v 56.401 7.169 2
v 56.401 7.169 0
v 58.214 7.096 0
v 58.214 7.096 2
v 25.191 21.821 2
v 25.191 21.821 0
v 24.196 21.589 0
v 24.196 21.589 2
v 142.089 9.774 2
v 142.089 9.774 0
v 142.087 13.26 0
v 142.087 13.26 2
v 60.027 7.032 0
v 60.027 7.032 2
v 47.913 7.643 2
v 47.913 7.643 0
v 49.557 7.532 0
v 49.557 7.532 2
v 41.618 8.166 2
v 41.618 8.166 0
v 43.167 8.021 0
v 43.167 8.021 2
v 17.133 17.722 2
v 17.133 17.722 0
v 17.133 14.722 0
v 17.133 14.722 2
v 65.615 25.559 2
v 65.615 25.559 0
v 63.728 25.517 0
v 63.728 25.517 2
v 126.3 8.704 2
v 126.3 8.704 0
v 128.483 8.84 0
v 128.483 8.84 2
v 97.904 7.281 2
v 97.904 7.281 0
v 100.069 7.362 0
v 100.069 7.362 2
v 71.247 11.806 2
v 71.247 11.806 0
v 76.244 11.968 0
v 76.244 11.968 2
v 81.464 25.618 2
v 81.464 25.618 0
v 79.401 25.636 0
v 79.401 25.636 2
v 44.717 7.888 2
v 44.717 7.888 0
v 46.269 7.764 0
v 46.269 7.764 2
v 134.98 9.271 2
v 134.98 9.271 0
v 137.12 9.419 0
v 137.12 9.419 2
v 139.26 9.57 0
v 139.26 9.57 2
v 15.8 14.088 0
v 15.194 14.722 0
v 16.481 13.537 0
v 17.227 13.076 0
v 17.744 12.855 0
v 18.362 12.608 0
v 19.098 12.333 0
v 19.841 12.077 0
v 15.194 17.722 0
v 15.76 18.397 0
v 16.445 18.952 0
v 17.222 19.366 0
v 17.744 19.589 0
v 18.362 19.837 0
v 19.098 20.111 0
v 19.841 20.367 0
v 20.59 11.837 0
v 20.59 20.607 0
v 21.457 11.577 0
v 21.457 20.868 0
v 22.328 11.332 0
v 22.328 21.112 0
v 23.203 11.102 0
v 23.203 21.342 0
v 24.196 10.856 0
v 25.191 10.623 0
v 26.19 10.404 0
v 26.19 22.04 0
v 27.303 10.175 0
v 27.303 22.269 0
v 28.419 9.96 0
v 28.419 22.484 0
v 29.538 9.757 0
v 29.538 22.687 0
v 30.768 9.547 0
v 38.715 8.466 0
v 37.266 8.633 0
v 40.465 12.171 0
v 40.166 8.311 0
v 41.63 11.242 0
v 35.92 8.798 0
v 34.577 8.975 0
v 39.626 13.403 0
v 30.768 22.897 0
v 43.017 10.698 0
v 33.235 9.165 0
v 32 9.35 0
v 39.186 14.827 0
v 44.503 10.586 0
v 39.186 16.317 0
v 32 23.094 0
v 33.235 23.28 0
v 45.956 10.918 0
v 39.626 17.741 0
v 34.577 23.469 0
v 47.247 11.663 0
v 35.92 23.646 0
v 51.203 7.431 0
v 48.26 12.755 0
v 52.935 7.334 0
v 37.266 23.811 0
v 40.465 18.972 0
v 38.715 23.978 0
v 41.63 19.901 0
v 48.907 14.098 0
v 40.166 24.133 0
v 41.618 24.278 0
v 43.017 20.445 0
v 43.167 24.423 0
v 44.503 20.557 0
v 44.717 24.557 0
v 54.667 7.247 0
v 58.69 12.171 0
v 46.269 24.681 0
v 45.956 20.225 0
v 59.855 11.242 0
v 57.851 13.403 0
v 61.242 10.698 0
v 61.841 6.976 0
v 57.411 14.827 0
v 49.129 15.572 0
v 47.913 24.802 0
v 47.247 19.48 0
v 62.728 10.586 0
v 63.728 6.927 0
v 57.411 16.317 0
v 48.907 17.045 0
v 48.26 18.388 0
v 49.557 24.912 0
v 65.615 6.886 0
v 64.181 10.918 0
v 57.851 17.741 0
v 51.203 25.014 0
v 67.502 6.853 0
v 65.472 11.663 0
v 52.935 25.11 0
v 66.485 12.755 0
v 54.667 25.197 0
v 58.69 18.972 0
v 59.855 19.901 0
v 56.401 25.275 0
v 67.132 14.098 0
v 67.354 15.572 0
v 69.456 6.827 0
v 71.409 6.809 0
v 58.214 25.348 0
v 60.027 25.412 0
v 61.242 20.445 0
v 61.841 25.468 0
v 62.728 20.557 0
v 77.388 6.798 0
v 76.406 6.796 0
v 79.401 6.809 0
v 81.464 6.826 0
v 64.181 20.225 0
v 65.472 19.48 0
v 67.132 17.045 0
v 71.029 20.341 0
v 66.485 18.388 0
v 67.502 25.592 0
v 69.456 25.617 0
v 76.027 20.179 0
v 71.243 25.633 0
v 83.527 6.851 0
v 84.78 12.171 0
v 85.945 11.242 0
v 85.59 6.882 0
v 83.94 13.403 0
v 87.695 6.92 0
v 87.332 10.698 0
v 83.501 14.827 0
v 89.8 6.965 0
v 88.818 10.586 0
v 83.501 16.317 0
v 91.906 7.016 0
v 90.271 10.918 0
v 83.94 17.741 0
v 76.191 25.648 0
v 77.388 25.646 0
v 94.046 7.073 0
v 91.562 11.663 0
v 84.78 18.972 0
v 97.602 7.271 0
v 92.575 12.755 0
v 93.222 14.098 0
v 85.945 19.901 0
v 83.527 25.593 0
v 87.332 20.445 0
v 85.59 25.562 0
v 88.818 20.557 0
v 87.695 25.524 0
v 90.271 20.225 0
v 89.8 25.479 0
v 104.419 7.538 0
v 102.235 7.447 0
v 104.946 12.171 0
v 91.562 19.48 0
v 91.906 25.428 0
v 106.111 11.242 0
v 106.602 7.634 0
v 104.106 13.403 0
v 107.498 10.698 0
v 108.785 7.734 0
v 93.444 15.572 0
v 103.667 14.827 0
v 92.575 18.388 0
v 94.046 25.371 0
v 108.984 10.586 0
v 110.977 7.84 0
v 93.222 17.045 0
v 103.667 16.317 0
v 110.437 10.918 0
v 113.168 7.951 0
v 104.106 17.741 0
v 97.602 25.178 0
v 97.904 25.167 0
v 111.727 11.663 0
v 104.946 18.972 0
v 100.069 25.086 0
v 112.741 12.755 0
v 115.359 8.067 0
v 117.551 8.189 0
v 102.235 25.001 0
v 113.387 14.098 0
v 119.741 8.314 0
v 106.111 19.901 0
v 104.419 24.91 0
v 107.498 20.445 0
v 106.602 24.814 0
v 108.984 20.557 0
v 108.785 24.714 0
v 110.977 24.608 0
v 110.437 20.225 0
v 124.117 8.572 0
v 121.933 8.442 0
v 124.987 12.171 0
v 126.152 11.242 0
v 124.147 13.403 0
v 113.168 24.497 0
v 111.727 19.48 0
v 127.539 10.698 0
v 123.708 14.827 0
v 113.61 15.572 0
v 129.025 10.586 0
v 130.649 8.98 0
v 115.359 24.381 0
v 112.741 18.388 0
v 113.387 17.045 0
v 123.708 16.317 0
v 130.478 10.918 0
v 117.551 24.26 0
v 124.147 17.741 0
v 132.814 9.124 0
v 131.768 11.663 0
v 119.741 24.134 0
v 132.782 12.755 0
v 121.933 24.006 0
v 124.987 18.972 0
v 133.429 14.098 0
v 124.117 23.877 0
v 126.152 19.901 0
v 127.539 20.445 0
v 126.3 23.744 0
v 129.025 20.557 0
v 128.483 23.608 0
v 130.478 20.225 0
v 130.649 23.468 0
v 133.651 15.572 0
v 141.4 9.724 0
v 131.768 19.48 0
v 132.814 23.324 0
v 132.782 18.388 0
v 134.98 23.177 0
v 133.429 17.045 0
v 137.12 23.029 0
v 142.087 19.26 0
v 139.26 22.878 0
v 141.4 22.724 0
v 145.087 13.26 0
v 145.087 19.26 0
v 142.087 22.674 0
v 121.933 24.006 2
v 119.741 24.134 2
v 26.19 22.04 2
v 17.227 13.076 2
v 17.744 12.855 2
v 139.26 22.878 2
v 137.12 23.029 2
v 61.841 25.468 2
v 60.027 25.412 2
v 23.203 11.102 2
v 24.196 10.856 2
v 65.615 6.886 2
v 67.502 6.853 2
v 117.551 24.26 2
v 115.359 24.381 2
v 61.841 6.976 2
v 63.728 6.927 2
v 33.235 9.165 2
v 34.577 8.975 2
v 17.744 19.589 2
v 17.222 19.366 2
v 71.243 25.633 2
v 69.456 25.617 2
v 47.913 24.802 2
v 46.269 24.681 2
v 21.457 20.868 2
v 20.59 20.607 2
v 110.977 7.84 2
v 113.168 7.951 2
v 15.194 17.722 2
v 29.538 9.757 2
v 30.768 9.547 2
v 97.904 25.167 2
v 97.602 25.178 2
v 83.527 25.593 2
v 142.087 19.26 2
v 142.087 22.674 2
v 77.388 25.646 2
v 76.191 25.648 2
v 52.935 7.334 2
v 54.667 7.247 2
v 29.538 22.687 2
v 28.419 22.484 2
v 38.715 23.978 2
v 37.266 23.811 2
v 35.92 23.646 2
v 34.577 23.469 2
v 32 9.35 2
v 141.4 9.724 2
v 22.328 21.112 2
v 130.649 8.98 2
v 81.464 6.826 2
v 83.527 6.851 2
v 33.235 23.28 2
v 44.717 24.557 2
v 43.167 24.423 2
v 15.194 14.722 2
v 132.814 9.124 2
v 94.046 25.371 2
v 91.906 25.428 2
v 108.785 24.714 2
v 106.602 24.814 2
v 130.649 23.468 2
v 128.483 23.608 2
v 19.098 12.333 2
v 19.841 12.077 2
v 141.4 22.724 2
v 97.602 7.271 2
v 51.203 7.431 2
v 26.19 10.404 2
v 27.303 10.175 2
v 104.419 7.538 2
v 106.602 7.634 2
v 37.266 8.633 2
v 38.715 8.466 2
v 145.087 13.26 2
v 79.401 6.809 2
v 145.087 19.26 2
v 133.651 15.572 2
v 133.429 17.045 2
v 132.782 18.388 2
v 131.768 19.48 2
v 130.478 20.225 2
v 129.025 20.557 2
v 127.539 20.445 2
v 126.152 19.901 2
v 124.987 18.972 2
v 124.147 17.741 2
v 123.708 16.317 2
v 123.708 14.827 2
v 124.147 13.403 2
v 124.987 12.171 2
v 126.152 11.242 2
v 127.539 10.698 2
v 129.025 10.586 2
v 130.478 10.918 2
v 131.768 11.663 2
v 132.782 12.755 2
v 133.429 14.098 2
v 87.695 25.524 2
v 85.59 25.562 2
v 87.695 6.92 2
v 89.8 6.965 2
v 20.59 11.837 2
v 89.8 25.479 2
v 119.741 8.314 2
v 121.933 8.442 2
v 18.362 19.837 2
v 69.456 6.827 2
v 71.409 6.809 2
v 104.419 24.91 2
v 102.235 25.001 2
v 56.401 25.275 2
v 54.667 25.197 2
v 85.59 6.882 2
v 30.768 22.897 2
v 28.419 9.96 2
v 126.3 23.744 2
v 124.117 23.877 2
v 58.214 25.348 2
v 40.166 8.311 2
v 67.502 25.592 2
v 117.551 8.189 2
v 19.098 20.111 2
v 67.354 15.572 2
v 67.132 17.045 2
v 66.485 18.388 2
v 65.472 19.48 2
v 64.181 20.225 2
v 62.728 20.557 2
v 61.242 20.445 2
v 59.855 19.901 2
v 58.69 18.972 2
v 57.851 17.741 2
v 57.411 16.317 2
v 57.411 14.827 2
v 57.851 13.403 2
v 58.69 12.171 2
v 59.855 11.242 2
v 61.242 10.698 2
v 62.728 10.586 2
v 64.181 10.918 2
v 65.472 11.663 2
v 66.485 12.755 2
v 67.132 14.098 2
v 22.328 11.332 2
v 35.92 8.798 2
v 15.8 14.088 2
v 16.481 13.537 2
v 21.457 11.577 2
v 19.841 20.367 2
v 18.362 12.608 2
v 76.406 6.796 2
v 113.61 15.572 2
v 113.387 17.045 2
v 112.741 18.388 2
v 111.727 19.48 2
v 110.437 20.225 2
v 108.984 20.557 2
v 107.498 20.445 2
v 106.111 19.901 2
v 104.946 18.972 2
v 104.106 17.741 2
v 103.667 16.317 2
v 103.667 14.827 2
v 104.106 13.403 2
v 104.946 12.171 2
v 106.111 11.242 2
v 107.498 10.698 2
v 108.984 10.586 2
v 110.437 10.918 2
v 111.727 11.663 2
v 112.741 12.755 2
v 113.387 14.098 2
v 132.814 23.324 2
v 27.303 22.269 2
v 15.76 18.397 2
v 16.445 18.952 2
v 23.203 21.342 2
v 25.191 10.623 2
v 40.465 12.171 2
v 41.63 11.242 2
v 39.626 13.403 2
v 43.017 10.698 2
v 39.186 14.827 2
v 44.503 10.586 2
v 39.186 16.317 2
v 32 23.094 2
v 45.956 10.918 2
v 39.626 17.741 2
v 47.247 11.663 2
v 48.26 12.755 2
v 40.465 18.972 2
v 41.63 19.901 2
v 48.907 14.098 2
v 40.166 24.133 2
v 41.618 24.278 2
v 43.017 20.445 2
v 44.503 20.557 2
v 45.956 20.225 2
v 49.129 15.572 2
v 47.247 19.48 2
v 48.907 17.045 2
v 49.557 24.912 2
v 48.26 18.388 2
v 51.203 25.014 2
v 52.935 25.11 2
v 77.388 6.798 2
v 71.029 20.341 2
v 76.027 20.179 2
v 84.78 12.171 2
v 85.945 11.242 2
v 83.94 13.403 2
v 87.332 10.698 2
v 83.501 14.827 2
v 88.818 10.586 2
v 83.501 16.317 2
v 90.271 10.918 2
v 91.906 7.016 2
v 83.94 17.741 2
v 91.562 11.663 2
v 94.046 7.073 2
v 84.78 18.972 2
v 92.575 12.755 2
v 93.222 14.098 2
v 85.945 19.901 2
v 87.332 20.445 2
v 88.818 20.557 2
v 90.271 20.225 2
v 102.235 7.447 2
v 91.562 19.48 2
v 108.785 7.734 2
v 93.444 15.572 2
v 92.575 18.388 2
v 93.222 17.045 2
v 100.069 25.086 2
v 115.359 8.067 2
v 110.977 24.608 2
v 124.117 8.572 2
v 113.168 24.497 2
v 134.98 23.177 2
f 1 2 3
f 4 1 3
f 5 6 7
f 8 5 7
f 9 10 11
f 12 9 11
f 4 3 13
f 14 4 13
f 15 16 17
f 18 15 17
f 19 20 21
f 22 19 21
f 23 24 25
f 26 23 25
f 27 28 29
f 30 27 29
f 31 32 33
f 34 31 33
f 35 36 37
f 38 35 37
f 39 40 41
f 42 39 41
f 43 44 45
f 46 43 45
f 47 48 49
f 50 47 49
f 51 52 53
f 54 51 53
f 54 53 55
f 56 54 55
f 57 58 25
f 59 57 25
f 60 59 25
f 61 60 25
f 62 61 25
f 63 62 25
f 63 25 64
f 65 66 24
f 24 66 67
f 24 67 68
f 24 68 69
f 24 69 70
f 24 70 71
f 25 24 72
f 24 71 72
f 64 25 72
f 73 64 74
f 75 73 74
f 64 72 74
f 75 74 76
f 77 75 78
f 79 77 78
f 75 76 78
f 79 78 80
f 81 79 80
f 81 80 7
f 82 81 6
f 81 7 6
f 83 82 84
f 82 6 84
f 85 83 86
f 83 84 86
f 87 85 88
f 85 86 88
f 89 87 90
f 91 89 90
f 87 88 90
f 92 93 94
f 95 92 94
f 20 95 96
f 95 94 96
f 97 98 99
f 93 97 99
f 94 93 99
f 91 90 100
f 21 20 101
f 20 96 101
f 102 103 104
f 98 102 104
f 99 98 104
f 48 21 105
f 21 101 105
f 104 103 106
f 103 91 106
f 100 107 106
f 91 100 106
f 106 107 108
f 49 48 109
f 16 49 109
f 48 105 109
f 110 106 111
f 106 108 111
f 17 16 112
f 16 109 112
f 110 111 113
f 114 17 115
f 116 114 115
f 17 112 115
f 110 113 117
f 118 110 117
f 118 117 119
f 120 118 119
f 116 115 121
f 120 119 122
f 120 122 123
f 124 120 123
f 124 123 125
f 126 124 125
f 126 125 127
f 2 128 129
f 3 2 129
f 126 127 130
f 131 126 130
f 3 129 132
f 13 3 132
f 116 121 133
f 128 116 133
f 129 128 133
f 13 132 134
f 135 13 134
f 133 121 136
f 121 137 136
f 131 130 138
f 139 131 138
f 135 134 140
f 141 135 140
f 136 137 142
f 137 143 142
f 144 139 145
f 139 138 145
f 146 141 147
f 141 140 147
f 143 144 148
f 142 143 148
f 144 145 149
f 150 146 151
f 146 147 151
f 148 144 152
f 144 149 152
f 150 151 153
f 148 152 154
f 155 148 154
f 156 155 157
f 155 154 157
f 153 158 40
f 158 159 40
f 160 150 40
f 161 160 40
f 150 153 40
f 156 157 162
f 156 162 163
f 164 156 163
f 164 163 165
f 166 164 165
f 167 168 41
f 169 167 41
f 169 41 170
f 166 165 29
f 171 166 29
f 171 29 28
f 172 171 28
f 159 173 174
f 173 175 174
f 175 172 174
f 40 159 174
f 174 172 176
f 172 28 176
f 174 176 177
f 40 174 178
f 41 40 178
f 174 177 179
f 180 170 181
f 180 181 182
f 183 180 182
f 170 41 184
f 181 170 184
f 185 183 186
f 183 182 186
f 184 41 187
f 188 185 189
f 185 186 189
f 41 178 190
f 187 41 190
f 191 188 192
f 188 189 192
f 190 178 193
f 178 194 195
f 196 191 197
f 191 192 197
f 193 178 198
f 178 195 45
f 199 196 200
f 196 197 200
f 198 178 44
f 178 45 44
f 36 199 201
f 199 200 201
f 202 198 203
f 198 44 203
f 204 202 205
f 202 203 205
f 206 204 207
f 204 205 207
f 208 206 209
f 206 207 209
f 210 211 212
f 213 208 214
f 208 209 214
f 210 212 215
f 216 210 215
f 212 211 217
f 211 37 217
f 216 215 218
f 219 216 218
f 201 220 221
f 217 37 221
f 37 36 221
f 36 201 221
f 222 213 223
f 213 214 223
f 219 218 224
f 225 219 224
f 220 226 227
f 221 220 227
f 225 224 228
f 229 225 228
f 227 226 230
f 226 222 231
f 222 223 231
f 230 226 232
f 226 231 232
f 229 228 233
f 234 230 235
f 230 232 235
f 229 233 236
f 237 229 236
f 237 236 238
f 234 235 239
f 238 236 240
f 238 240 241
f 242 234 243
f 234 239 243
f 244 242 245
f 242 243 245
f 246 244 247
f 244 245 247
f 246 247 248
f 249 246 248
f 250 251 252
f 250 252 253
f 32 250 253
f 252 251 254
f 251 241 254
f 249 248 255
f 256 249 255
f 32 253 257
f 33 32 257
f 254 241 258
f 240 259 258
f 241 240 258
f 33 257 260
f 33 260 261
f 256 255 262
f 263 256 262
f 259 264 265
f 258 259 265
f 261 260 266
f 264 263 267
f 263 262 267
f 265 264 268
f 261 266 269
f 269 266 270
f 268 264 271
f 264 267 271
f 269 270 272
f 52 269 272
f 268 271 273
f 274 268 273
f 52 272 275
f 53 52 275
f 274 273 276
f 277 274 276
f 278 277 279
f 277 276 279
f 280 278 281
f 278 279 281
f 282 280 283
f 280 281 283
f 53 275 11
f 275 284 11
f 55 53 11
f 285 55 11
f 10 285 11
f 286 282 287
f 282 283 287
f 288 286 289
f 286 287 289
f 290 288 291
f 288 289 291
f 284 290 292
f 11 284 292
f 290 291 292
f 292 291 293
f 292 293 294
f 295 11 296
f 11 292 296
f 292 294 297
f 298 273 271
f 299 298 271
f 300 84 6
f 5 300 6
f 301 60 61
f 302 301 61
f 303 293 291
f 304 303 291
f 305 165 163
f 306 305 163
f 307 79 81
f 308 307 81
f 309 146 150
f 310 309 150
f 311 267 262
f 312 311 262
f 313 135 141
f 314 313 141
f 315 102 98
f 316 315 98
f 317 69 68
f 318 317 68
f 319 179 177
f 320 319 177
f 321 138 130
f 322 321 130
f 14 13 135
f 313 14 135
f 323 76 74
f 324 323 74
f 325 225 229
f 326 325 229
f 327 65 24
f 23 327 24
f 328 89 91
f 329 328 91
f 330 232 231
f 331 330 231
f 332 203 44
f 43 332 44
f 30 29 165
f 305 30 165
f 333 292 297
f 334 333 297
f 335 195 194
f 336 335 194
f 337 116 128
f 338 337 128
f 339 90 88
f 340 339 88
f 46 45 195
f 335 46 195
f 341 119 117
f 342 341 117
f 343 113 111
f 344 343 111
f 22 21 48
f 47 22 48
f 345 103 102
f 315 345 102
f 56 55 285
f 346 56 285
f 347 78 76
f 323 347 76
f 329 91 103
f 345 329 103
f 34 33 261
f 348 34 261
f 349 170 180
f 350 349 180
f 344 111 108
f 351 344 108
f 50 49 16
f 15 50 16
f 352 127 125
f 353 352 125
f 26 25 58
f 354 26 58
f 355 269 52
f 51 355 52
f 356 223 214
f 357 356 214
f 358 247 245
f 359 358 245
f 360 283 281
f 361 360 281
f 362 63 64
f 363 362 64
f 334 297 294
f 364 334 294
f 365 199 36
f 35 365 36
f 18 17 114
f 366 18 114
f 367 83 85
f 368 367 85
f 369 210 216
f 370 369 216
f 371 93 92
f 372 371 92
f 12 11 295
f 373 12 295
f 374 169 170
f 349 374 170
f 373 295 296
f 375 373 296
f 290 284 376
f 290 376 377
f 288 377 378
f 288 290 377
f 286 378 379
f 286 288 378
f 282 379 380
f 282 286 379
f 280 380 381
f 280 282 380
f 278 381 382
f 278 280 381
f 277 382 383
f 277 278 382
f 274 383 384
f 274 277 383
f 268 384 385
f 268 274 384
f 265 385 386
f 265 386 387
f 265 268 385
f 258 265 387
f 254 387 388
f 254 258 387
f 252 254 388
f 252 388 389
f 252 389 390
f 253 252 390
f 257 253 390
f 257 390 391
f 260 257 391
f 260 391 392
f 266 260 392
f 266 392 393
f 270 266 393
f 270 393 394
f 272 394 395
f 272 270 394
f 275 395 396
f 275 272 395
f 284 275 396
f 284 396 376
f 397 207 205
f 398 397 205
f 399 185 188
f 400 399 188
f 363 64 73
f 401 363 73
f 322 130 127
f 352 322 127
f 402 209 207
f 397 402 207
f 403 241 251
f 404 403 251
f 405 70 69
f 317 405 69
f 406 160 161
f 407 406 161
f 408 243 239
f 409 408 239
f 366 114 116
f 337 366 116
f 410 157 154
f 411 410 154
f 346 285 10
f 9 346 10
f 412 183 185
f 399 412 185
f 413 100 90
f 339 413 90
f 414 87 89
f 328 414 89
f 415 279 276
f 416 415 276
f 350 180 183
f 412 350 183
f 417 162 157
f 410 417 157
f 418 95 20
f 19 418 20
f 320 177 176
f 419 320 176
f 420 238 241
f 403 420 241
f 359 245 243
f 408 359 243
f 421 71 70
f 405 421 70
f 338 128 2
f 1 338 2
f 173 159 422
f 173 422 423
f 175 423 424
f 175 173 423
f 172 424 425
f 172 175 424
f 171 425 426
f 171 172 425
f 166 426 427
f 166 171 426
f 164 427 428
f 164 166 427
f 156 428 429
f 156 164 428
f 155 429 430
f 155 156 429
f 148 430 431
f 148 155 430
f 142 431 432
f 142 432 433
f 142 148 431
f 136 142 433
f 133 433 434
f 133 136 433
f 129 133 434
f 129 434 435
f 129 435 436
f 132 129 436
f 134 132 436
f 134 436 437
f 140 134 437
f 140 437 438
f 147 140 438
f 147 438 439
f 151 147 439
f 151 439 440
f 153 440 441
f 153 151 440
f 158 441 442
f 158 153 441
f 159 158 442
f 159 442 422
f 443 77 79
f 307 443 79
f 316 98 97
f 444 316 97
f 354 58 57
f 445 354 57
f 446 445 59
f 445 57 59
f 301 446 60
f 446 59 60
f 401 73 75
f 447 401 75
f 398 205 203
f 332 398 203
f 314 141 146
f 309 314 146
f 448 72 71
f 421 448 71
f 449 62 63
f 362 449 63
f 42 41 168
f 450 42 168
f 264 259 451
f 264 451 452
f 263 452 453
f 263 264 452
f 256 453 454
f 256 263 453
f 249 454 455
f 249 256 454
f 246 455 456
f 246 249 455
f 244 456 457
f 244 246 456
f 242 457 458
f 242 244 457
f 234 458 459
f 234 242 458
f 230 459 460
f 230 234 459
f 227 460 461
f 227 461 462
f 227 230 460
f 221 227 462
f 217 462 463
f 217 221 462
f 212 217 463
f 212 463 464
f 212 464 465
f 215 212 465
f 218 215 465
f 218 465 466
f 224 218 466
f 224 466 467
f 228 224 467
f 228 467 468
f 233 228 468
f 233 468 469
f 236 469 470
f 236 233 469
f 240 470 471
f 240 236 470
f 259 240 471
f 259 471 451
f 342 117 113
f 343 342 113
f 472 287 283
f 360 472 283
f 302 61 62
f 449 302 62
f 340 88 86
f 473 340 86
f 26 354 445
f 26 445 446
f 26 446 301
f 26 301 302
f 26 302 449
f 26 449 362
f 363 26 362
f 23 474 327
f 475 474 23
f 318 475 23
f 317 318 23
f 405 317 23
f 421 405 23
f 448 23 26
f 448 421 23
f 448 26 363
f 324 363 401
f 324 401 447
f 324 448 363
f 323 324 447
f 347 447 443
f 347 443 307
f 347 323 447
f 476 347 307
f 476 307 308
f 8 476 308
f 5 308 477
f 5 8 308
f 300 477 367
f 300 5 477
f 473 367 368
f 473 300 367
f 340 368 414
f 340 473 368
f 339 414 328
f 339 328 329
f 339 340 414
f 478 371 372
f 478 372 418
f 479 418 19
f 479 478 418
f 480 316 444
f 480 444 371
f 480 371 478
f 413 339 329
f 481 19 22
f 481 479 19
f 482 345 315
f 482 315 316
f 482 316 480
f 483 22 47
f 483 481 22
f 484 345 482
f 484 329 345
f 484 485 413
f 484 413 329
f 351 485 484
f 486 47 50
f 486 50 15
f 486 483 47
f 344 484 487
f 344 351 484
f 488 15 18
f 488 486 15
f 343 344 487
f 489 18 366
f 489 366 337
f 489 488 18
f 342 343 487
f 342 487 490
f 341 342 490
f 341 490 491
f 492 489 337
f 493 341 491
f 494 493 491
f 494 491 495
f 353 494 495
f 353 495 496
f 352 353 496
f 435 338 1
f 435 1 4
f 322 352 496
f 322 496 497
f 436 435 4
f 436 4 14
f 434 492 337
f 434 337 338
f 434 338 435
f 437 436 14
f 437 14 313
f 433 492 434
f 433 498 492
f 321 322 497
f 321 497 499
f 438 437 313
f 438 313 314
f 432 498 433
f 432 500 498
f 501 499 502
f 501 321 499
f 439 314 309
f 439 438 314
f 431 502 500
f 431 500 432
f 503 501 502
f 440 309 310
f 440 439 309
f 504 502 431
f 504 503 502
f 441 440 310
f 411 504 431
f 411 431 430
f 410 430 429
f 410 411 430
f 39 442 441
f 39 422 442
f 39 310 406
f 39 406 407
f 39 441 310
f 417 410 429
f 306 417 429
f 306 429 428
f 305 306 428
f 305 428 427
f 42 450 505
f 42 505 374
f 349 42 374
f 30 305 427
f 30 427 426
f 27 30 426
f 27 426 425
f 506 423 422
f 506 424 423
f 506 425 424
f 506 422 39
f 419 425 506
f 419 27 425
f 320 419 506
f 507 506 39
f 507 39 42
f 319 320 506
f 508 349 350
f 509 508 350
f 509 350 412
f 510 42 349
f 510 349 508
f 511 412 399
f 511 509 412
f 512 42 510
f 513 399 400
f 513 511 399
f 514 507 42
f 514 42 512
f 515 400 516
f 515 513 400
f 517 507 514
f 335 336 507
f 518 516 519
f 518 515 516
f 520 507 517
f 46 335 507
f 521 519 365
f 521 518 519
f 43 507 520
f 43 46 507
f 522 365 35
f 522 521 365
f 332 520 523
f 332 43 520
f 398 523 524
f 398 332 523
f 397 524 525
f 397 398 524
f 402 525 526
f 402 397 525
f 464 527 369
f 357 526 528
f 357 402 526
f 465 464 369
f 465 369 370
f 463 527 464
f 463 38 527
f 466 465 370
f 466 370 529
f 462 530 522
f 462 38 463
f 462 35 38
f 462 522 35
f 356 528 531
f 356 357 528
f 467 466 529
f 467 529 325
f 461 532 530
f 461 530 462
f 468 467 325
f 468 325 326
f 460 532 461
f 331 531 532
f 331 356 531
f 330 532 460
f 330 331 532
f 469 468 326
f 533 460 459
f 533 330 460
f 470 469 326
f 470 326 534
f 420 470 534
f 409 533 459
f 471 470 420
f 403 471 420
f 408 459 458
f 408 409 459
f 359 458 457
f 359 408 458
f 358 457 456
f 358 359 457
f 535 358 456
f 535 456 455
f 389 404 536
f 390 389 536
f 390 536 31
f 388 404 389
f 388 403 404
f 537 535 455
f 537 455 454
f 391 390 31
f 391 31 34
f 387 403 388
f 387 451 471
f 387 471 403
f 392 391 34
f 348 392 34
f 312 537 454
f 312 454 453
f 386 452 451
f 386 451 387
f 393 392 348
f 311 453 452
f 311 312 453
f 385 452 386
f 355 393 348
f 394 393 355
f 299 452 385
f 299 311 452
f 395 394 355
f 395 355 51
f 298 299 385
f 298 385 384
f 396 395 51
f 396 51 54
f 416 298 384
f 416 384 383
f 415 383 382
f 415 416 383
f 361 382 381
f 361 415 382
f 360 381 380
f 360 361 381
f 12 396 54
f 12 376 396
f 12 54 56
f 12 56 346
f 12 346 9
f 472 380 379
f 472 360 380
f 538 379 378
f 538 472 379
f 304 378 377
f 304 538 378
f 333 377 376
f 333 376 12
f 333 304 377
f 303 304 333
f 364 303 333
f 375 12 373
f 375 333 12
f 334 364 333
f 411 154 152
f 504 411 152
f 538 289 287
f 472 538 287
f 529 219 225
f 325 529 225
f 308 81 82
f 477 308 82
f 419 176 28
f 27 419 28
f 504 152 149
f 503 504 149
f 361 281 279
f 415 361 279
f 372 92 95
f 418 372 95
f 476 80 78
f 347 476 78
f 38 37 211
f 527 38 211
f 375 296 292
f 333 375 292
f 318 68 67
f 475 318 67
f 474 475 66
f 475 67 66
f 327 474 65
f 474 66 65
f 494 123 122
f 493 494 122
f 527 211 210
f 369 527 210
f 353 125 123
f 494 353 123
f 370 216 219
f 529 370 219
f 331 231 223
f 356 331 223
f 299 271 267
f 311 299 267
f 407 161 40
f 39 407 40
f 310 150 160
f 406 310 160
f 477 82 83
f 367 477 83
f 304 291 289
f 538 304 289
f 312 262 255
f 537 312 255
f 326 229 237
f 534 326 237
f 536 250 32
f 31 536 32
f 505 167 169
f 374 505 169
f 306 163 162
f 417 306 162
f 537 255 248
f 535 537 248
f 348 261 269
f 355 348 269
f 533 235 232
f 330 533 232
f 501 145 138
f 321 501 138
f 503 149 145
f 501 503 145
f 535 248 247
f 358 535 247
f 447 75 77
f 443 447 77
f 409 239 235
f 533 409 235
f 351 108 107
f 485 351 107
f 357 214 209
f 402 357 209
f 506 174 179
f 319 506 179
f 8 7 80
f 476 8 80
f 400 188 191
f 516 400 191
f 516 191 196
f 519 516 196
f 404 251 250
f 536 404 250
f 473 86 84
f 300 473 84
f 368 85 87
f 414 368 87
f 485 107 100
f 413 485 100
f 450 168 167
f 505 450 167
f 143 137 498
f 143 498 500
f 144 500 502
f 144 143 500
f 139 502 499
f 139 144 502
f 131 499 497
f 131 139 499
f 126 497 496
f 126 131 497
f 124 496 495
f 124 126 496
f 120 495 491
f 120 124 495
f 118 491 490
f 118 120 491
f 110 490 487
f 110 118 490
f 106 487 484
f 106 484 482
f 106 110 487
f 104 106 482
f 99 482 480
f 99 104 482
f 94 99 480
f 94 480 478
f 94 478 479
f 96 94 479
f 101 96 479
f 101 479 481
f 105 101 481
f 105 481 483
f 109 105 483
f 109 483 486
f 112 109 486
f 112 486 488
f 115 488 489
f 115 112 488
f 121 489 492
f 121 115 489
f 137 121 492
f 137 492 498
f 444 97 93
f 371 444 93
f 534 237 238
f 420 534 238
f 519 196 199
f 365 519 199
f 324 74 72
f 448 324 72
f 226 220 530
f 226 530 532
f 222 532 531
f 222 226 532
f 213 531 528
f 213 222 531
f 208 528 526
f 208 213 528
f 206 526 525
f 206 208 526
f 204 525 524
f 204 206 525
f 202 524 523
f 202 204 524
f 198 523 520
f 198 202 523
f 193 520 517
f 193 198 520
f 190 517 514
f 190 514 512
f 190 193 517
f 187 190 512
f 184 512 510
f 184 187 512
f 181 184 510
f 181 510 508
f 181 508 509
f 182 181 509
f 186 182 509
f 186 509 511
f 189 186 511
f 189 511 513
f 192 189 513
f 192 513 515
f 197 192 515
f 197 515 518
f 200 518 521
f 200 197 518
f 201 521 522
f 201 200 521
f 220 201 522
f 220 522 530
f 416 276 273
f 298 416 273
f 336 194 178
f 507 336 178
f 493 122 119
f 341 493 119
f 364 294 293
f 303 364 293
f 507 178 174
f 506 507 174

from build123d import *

# Parameters (mm, degrees)
MODEL_R         = 4.999197418
EXTRUDE_1_DEPTH = 2


with BuildPart() as part:
    # Model → 凸台-拉伸1 (new body)
    with BuildSketch(Plane.XY):
        with BuildLine():
            Line((15.194094226, 17.721853744), (17.133079466, 17.721853744))
            Line((17.133079466, 17.721853744), (17.133079466, 14.721853744))
            Line((17.133079466, 14.721853744), (15.194094226, 14.721853744))
            ThreePointArc((15.194094226, 14.721853744), (16.131604287, 13.801473468), (17.226994751, 13.076115145))
            Line((17.226994751, 13.076115145), (17.74383436, 12.854853744))
            Line((17.74383436, 12.854853744), (18.36183436, 12.607853744))
            Line((18.36183436, 12.607853744), (19.09783436, 12.332853744))
            Line((19.09783436, 12.332853744), (19.84083436, 12.076853744))
            Line((19.84083436, 12.076853744), (20.58983436, 11.836853744))
            Line((20.58983436, 11.836853744), (21.45683436, 11.576853744))
            Line((21.45683436, 11.576853744), (22.32783436, 11.331853744))
            Line((22.32783436, 11.331853744), (23.20283436, 11.101853744))
            Line((23.20283436, 11.101853744), (24.19583436, 10.855853744))
            Line((24.19583436, 10.855853744), (25.19083436, 10.622853744))
            Line((25.19083436, 10.622853744), (26.18983436, 10.403853744))
            Line((26.18983436, 10.403853744), (27.30283436, 10.174853744))
            Line((27.30283436, 10.174853744), (28.41883436, 9.959853744))
            Line((28.41883436, 9.959853744), (29.53783436, 9.756853744))
            Line((29.53783436, 9.756853744), (30.76783436, 9.546853744))
            Line((30.76783436, 9.546853744), (31.99983436, 9.349853744))
            Line((31.99983436, 9.349853744), (33.23483436, 9.164853744))
            Line((33.23483436, 9.164853744), (34.57683436, 8.974853744))
            Line((34.57683436, 8.974853744), (35.91983436, 8.797853744))
            Line((35.91983436, 8.797853744), (37.26583436, 8.632853744))
            Line((37.26583436, 8.632853744), (38.71483436, 8.465853744))
            Line((38.71483436, 8.465853744), (40.16583436, 8.310853744))
            Line((40.16583436, 8.310853744), (41.61783436, 8.165853744))
            Line((41.61783436, 8.165853744), (43.16683436, 8.020853744))
            Line((43.16683436, 8.020853744), (44.71683436, 7.887853744))
            Line((44.71683436, 7.887853744), (46.26883436, 7.763853744))
            Line((46.26883436, 7.763853744), (47.91283436, 7.642853744))
            Line((47.91283436, 7.642853744), (49.55683436, 7.531853744))
            Line((49.55683436, 7.531853744), (51.20283436, 7.430853744))
            Line((51.20283436, 7.430853744), (52.93483436, 7.333853744))
            Line((52.93483436, 7.333853744), (54.66683436, 7.246853744))
            Line((54.66683436, 7.246853744), (56.40083436, 7.168853744))
            Line((56.40083436, 7.168853744), (58.21383436, 7.095853744))
            Line((58.21383436, 7.095853744), (60.02683436, 7.031853744))
            Line((60.02683436, 7.031853744), (61.84083436, 6.975853744))
            Line((61.84083436, 6.975853744), (63.72783436, 6.926853744))
            Line((63.72783436, 6.926853744), (65.61483436, 6.885853744))
            Line((65.61483436, 6.885853744), (67.50183436, 6.852853744))
            Line((67.50183436, 6.852853744), (69.45583436, 6.826853744))
            Line((69.45583436, 6.826853744), (71.40883436, 6.808853744))
            Line((71.40883436, 6.808853744), (71.24683436, 11.805853744))
            Line((71.24683436, 11.805853744), (76.24383436, 11.967853744))
            Line((76.24383436, 11.967853744), (76.40583436, 6.796082515))
            Line((76.40583436, 6.796082515), (77.38783436, 6.797853744))
            Line((77.38783436, 6.797853744), (79.40083436, 6.808853744))
            Line((79.40083436, 6.808853744), (81.46383436, 6.825853744))
            Line((81.46383436, 6.825853744), (83.52683436, 6.850853744))
            Line((83.52683436, 6.850853744), (85.58983436, 6.881853744))
            Line((85.58983436, 6.881853744), (87.69483436, 6.919853744))
            Line((87.69483436, 6.919853744), (89.79983436, 6.964853744))
            Line((89.79983436, 6.964853744), (91.90583436, 7.015853744))
            Line((91.90583436, 7.015853744), (94.04583436, 7.072853744))
            Line((94.04583436, 7.072853744), (97.601964333, 7.270653793))
            Line((97.601964333, 7.270653793), (97.90379269, 7.281104913))
            Line((97.90379269, 7.281104913), (100.06879269, 7.362104913))
            Line((100.06879269, 7.362104913), (102.23479269, 7.447104913))
            Line((102.23479269, 7.447104913), (104.41879269, 7.538104913))
            Line((104.41879269, 7.538104913), (106.60179269, 7.634104913))
            Line((106.60179269, 7.634104913), (108.78479269, 7.734104913))
            Line((108.78479269, 7.734104913), (110.97679269, 7.840104913))
            Line((110.97679269, 7.840104913), (113.16779269, 7.951104913))
            Line((113.16779269, 7.951104913), (115.35879269, 8.067104913))
            Line((115.35879269, 8.067104913), (117.55079269, 8.189104913))
            Line((117.55079269, 8.189104913), (119.74079269, 8.314104913))
            Line((119.74079269, 8.314104913), (121.93279269, 8.442104913))
            Line((121.93279269, 8.442104913), (124.11679269, 8.572104913))
            Line((124.11679269, 8.572104913), (126.29979269, 8.704104913))
            Line((126.29979269, 8.704104913), (128.48279269, 8.840104913))
            Line((128.48279269, 8.840104913), (130.64879269, 8.980104913))
            Line((130.64879269, 8.980104913), (132.81379269, 9.124104913))
            Line((132.81379269, 9.124104913), (134.97979269, 9.271104913))
            Line((134.97979269, 9.271104913), (137.11979269, 9.419104913))
            Line((137.11979269, 9.419104913), (139.25979269, 9.570104913))
            Line((139.25979269, 9.570104913), (141.39979269, 9.724104913))
            Line((141.39979269, 9.724104913), (142.088794604, 9.774487769))
            Line((142.088794604, 9.774487769), (142.086848241, 13.259514384))
            Line((142.086848241, 13.259514384), (145.086848241, 13.259514384))
            Line((145.086848241, 13.259514384), (145.086848241, 19.259514384))
            Line((145.086848241, 19.259514384), (142.086848241, 19.259514384))
            Line((142.086848241, 19.259514384), (142.086848241, 22.673864384))
            Line((142.086848241, 22.673864384), (141.39979269, 22.724104913))
            Line((141.39979269, 22.724104913), (139.25979269, 22.878104913))
            Line((139.25979269, 22.878104913), (137.11979269, 23.029104913))
            Line((137.11979269, 23.029104913), (134.97979269, 23.177104913))
            Line((134.97979269, 23.177104913), (132.81379269, 23.324104913))
            Line((132.81379269, 23.324104913), (130.64879269, 23.468104913))
            Line((130.64879269, 23.468104913), (128.48279269, 23.608104913))
            Line((128.48279269, 23.608104913), (126.29979269, 23.744104913))
            Line((126.29979269, 23.744104913), (124.11679269, 23.877104913))
            Line((124.11679269, 23.877104913), (121.93279269, 24.006104913))
            Line((121.93279269, 24.006104913), (119.74079269, 24.134104913))
            Line((119.74079269, 24.134104913), (117.55079269, 24.260104913))
            Line((117.55079269, 24.260104913), (115.35879269, 24.381104913))
            Line((115.35879269, 24.381104913), (113.16779269, 24.497104913))
            Line((113.16779269, 24.497104913), (110.97679269, 24.608104913))
            Line((110.97679269, 24.608104913), (108.78479269, 24.714104913))
            Line((108.78479269, 24.714104913), (106.60179269, 24.814104913))
            Line((106.60179269, 24.814104913), (104.41879269, 24.910104913))
            Line((104.41879269, 24.910104913), (102.23479269, 25.001104913))
            Line((102.23479269, 25.001104913), (100.06879269, 25.086104913))
            Line((100.06879269, 25.086104913), (97.90379269, 25.167104913))
            Line((97.90379269, 25.167104913), (97.601514741, 25.177571601))
            Line((97.601514741, 25.177571601), (94.04583436, 25.370853744))
            Line((94.04583436, 25.370853744), (91.90583436, 25.427853744))
            Line((91.90583436, 25.427853744), (89.79983436, 25.478853744))
            Line((89.79983436, 25.478853744), (87.69483436, 25.523853744))
            Line((87.69483436, 25.523853744), (85.58983436, 25.561853744))
            Line((85.58983436, 25.561853744), (83.52683436, 25.592853744))
            Line((83.52683436, 25.592853744), (81.46383436, 25.617853744))
            Line((81.46383436, 25.617853744), (79.40083436, 25.635853744))
            Line((79.40083436, 25.635853744), (77.38783436, 25.645853744))
            Line((77.38783436, 25.645853744), (76.190756889, 25.64823362))
            Line((76.190756889, 25.64823362), (76.02683436, 20.178853744))
            Line((76.02683436, 20.178853744), (71.02883436, 20.340853744))
            Line((71.02883436, 20.340853744), (71.243114412, 25.633326371))
            Line((71.243114412, 25.633326371), (69.45583436, 25.616853744))
            Line((69.45583436, 25.616853744), (67.50183436, 25.591853744))
            Line((67.50183436, 25.591853744), (65.61483436, 25.558853744))
            Line((65.61483436, 25.558853744), (63.72783436, 25.516853744))
            Line((63.72783436, 25.516853744), (61.84083436, 25.467853744))
            Line((61.84083436, 25.467853744), (60.02683436, 25.411853744))
            Line((60.02683436, 25.411853744), (58.21383436, 25.347853744))
            Line((58.21383436, 25.347853744), (56.40083436, 25.274853744))
            Line((56.40083436, 25.274853744), (54.66683436, 25.196853744))
            Line((54.66683436, 25.196853744), (52.93483436, 25.109853744))
            Line((52.93483436, 25.109853744), (51.20283436, 25.013853744))
            Line((51.20283436, 25.013853744), (49.55683436, 24.911853744))
            Line((49.55683436, 24.911853744), (47.91283436, 24.801853744))
            Line((47.91283436, 24.801853744), (46.26883436, 24.680853744))
            Line((46.26883436, 24.680853744), (44.71683436, 24.556853744))
            Line((44.71683436, 24.556853744), (43.16683436, 24.422853744))
            Line((43.16683436, 24.422853744), (41.61783436, 24.277853744))
            Line((41.61783436, 24.277853744), (40.16583436, 24.132853744))
            Line((40.16583436, 24.132853744), (38.71483436, 23.977853744))
            Line((38.71483436, 23.977853744), (37.26583436, 23.810853744))
            Line((37.26583436, 23.810853744), (35.91983436, 23.645853744))
            Line((35.91983436, 23.645853744), (34.57683436, 23.468853744))
            Line((34.57683436, 23.468853744), (33.23483436, 23.279853744))
            Line((33.23483436, 23.279853744), (31.99983436, 23.093853744))
            Line((31.99983436, 23.093853744), (30.76783436, 22.896853744))
            Line((30.76783436, 22.896853744), (29.53783436, 22.686853744))
            Line((29.53783436, 22.686853744), (28.41883436, 22.483853744))
            Line((28.41883436, 22.483853744), (27.30283436, 22.268853744))
            Line((27.30283436, 22.268853744), (26.18983436, 22.039853744))
            Line((26.18983436, 22.039853744), (25.19083436, 21.820853744))
            Line((25.19083436, 21.820853744), (24.19583436, 21.588853744))
            Line((24.19583436, 21.588853744), (23.20283436, 21.341853744))
            Line((23.20283436, 21.341853744), (22.32783436, 21.111853744))
            Line((22.32783436, 21.111853744), (21.45683436, 20.867853744))
            Line((21.45683436, 20.867853744), (20.58983436, 20.606853744))
            Line((20.58983436, 20.606853744), (19.84083436, 20.366853744))
            Line((19.84083436, 20.366853744), (19.09783436, 20.110853744))
            Line((19.09783436, 20.110853744), (18.36183436, 19.836853744))
            Line((18.36183436, 19.836853744), (17.74383436, 19.588853744))
            Line((17.74383436, 19.588853744), (17.222488144, 19.365660445))
            ThreePointArc((17.222488144, 19.365660445), (16.089203867, 18.690706241), (15.194094226, 17.721853744))
        make_face()
        with Locations((62.354774691, 15.571631352)):
            Circle(MODEL_R, mode=Mode.SUBTRACT)
        with Locations((88.444584336, 15.571631352)):
            Circle(MODEL_R, mode=Mode.SUBTRACT)
        with Locations((108.610323656, 15.571631352)):
            Circle(MODEL_R, mode=Mode.SUBTRACT)
        with Locations((128.651429135, 15.571631352)):
            Circle(MODEL_R, mode=Mode.SUBTRACT)
        with Locations((44.129846481, 15.571631352)):
            Circle(MODEL_R, mode=Mode.SUBTRACT)
    extrude(amount=EXTRUDE_1_DEPTH)


solid = part.part
